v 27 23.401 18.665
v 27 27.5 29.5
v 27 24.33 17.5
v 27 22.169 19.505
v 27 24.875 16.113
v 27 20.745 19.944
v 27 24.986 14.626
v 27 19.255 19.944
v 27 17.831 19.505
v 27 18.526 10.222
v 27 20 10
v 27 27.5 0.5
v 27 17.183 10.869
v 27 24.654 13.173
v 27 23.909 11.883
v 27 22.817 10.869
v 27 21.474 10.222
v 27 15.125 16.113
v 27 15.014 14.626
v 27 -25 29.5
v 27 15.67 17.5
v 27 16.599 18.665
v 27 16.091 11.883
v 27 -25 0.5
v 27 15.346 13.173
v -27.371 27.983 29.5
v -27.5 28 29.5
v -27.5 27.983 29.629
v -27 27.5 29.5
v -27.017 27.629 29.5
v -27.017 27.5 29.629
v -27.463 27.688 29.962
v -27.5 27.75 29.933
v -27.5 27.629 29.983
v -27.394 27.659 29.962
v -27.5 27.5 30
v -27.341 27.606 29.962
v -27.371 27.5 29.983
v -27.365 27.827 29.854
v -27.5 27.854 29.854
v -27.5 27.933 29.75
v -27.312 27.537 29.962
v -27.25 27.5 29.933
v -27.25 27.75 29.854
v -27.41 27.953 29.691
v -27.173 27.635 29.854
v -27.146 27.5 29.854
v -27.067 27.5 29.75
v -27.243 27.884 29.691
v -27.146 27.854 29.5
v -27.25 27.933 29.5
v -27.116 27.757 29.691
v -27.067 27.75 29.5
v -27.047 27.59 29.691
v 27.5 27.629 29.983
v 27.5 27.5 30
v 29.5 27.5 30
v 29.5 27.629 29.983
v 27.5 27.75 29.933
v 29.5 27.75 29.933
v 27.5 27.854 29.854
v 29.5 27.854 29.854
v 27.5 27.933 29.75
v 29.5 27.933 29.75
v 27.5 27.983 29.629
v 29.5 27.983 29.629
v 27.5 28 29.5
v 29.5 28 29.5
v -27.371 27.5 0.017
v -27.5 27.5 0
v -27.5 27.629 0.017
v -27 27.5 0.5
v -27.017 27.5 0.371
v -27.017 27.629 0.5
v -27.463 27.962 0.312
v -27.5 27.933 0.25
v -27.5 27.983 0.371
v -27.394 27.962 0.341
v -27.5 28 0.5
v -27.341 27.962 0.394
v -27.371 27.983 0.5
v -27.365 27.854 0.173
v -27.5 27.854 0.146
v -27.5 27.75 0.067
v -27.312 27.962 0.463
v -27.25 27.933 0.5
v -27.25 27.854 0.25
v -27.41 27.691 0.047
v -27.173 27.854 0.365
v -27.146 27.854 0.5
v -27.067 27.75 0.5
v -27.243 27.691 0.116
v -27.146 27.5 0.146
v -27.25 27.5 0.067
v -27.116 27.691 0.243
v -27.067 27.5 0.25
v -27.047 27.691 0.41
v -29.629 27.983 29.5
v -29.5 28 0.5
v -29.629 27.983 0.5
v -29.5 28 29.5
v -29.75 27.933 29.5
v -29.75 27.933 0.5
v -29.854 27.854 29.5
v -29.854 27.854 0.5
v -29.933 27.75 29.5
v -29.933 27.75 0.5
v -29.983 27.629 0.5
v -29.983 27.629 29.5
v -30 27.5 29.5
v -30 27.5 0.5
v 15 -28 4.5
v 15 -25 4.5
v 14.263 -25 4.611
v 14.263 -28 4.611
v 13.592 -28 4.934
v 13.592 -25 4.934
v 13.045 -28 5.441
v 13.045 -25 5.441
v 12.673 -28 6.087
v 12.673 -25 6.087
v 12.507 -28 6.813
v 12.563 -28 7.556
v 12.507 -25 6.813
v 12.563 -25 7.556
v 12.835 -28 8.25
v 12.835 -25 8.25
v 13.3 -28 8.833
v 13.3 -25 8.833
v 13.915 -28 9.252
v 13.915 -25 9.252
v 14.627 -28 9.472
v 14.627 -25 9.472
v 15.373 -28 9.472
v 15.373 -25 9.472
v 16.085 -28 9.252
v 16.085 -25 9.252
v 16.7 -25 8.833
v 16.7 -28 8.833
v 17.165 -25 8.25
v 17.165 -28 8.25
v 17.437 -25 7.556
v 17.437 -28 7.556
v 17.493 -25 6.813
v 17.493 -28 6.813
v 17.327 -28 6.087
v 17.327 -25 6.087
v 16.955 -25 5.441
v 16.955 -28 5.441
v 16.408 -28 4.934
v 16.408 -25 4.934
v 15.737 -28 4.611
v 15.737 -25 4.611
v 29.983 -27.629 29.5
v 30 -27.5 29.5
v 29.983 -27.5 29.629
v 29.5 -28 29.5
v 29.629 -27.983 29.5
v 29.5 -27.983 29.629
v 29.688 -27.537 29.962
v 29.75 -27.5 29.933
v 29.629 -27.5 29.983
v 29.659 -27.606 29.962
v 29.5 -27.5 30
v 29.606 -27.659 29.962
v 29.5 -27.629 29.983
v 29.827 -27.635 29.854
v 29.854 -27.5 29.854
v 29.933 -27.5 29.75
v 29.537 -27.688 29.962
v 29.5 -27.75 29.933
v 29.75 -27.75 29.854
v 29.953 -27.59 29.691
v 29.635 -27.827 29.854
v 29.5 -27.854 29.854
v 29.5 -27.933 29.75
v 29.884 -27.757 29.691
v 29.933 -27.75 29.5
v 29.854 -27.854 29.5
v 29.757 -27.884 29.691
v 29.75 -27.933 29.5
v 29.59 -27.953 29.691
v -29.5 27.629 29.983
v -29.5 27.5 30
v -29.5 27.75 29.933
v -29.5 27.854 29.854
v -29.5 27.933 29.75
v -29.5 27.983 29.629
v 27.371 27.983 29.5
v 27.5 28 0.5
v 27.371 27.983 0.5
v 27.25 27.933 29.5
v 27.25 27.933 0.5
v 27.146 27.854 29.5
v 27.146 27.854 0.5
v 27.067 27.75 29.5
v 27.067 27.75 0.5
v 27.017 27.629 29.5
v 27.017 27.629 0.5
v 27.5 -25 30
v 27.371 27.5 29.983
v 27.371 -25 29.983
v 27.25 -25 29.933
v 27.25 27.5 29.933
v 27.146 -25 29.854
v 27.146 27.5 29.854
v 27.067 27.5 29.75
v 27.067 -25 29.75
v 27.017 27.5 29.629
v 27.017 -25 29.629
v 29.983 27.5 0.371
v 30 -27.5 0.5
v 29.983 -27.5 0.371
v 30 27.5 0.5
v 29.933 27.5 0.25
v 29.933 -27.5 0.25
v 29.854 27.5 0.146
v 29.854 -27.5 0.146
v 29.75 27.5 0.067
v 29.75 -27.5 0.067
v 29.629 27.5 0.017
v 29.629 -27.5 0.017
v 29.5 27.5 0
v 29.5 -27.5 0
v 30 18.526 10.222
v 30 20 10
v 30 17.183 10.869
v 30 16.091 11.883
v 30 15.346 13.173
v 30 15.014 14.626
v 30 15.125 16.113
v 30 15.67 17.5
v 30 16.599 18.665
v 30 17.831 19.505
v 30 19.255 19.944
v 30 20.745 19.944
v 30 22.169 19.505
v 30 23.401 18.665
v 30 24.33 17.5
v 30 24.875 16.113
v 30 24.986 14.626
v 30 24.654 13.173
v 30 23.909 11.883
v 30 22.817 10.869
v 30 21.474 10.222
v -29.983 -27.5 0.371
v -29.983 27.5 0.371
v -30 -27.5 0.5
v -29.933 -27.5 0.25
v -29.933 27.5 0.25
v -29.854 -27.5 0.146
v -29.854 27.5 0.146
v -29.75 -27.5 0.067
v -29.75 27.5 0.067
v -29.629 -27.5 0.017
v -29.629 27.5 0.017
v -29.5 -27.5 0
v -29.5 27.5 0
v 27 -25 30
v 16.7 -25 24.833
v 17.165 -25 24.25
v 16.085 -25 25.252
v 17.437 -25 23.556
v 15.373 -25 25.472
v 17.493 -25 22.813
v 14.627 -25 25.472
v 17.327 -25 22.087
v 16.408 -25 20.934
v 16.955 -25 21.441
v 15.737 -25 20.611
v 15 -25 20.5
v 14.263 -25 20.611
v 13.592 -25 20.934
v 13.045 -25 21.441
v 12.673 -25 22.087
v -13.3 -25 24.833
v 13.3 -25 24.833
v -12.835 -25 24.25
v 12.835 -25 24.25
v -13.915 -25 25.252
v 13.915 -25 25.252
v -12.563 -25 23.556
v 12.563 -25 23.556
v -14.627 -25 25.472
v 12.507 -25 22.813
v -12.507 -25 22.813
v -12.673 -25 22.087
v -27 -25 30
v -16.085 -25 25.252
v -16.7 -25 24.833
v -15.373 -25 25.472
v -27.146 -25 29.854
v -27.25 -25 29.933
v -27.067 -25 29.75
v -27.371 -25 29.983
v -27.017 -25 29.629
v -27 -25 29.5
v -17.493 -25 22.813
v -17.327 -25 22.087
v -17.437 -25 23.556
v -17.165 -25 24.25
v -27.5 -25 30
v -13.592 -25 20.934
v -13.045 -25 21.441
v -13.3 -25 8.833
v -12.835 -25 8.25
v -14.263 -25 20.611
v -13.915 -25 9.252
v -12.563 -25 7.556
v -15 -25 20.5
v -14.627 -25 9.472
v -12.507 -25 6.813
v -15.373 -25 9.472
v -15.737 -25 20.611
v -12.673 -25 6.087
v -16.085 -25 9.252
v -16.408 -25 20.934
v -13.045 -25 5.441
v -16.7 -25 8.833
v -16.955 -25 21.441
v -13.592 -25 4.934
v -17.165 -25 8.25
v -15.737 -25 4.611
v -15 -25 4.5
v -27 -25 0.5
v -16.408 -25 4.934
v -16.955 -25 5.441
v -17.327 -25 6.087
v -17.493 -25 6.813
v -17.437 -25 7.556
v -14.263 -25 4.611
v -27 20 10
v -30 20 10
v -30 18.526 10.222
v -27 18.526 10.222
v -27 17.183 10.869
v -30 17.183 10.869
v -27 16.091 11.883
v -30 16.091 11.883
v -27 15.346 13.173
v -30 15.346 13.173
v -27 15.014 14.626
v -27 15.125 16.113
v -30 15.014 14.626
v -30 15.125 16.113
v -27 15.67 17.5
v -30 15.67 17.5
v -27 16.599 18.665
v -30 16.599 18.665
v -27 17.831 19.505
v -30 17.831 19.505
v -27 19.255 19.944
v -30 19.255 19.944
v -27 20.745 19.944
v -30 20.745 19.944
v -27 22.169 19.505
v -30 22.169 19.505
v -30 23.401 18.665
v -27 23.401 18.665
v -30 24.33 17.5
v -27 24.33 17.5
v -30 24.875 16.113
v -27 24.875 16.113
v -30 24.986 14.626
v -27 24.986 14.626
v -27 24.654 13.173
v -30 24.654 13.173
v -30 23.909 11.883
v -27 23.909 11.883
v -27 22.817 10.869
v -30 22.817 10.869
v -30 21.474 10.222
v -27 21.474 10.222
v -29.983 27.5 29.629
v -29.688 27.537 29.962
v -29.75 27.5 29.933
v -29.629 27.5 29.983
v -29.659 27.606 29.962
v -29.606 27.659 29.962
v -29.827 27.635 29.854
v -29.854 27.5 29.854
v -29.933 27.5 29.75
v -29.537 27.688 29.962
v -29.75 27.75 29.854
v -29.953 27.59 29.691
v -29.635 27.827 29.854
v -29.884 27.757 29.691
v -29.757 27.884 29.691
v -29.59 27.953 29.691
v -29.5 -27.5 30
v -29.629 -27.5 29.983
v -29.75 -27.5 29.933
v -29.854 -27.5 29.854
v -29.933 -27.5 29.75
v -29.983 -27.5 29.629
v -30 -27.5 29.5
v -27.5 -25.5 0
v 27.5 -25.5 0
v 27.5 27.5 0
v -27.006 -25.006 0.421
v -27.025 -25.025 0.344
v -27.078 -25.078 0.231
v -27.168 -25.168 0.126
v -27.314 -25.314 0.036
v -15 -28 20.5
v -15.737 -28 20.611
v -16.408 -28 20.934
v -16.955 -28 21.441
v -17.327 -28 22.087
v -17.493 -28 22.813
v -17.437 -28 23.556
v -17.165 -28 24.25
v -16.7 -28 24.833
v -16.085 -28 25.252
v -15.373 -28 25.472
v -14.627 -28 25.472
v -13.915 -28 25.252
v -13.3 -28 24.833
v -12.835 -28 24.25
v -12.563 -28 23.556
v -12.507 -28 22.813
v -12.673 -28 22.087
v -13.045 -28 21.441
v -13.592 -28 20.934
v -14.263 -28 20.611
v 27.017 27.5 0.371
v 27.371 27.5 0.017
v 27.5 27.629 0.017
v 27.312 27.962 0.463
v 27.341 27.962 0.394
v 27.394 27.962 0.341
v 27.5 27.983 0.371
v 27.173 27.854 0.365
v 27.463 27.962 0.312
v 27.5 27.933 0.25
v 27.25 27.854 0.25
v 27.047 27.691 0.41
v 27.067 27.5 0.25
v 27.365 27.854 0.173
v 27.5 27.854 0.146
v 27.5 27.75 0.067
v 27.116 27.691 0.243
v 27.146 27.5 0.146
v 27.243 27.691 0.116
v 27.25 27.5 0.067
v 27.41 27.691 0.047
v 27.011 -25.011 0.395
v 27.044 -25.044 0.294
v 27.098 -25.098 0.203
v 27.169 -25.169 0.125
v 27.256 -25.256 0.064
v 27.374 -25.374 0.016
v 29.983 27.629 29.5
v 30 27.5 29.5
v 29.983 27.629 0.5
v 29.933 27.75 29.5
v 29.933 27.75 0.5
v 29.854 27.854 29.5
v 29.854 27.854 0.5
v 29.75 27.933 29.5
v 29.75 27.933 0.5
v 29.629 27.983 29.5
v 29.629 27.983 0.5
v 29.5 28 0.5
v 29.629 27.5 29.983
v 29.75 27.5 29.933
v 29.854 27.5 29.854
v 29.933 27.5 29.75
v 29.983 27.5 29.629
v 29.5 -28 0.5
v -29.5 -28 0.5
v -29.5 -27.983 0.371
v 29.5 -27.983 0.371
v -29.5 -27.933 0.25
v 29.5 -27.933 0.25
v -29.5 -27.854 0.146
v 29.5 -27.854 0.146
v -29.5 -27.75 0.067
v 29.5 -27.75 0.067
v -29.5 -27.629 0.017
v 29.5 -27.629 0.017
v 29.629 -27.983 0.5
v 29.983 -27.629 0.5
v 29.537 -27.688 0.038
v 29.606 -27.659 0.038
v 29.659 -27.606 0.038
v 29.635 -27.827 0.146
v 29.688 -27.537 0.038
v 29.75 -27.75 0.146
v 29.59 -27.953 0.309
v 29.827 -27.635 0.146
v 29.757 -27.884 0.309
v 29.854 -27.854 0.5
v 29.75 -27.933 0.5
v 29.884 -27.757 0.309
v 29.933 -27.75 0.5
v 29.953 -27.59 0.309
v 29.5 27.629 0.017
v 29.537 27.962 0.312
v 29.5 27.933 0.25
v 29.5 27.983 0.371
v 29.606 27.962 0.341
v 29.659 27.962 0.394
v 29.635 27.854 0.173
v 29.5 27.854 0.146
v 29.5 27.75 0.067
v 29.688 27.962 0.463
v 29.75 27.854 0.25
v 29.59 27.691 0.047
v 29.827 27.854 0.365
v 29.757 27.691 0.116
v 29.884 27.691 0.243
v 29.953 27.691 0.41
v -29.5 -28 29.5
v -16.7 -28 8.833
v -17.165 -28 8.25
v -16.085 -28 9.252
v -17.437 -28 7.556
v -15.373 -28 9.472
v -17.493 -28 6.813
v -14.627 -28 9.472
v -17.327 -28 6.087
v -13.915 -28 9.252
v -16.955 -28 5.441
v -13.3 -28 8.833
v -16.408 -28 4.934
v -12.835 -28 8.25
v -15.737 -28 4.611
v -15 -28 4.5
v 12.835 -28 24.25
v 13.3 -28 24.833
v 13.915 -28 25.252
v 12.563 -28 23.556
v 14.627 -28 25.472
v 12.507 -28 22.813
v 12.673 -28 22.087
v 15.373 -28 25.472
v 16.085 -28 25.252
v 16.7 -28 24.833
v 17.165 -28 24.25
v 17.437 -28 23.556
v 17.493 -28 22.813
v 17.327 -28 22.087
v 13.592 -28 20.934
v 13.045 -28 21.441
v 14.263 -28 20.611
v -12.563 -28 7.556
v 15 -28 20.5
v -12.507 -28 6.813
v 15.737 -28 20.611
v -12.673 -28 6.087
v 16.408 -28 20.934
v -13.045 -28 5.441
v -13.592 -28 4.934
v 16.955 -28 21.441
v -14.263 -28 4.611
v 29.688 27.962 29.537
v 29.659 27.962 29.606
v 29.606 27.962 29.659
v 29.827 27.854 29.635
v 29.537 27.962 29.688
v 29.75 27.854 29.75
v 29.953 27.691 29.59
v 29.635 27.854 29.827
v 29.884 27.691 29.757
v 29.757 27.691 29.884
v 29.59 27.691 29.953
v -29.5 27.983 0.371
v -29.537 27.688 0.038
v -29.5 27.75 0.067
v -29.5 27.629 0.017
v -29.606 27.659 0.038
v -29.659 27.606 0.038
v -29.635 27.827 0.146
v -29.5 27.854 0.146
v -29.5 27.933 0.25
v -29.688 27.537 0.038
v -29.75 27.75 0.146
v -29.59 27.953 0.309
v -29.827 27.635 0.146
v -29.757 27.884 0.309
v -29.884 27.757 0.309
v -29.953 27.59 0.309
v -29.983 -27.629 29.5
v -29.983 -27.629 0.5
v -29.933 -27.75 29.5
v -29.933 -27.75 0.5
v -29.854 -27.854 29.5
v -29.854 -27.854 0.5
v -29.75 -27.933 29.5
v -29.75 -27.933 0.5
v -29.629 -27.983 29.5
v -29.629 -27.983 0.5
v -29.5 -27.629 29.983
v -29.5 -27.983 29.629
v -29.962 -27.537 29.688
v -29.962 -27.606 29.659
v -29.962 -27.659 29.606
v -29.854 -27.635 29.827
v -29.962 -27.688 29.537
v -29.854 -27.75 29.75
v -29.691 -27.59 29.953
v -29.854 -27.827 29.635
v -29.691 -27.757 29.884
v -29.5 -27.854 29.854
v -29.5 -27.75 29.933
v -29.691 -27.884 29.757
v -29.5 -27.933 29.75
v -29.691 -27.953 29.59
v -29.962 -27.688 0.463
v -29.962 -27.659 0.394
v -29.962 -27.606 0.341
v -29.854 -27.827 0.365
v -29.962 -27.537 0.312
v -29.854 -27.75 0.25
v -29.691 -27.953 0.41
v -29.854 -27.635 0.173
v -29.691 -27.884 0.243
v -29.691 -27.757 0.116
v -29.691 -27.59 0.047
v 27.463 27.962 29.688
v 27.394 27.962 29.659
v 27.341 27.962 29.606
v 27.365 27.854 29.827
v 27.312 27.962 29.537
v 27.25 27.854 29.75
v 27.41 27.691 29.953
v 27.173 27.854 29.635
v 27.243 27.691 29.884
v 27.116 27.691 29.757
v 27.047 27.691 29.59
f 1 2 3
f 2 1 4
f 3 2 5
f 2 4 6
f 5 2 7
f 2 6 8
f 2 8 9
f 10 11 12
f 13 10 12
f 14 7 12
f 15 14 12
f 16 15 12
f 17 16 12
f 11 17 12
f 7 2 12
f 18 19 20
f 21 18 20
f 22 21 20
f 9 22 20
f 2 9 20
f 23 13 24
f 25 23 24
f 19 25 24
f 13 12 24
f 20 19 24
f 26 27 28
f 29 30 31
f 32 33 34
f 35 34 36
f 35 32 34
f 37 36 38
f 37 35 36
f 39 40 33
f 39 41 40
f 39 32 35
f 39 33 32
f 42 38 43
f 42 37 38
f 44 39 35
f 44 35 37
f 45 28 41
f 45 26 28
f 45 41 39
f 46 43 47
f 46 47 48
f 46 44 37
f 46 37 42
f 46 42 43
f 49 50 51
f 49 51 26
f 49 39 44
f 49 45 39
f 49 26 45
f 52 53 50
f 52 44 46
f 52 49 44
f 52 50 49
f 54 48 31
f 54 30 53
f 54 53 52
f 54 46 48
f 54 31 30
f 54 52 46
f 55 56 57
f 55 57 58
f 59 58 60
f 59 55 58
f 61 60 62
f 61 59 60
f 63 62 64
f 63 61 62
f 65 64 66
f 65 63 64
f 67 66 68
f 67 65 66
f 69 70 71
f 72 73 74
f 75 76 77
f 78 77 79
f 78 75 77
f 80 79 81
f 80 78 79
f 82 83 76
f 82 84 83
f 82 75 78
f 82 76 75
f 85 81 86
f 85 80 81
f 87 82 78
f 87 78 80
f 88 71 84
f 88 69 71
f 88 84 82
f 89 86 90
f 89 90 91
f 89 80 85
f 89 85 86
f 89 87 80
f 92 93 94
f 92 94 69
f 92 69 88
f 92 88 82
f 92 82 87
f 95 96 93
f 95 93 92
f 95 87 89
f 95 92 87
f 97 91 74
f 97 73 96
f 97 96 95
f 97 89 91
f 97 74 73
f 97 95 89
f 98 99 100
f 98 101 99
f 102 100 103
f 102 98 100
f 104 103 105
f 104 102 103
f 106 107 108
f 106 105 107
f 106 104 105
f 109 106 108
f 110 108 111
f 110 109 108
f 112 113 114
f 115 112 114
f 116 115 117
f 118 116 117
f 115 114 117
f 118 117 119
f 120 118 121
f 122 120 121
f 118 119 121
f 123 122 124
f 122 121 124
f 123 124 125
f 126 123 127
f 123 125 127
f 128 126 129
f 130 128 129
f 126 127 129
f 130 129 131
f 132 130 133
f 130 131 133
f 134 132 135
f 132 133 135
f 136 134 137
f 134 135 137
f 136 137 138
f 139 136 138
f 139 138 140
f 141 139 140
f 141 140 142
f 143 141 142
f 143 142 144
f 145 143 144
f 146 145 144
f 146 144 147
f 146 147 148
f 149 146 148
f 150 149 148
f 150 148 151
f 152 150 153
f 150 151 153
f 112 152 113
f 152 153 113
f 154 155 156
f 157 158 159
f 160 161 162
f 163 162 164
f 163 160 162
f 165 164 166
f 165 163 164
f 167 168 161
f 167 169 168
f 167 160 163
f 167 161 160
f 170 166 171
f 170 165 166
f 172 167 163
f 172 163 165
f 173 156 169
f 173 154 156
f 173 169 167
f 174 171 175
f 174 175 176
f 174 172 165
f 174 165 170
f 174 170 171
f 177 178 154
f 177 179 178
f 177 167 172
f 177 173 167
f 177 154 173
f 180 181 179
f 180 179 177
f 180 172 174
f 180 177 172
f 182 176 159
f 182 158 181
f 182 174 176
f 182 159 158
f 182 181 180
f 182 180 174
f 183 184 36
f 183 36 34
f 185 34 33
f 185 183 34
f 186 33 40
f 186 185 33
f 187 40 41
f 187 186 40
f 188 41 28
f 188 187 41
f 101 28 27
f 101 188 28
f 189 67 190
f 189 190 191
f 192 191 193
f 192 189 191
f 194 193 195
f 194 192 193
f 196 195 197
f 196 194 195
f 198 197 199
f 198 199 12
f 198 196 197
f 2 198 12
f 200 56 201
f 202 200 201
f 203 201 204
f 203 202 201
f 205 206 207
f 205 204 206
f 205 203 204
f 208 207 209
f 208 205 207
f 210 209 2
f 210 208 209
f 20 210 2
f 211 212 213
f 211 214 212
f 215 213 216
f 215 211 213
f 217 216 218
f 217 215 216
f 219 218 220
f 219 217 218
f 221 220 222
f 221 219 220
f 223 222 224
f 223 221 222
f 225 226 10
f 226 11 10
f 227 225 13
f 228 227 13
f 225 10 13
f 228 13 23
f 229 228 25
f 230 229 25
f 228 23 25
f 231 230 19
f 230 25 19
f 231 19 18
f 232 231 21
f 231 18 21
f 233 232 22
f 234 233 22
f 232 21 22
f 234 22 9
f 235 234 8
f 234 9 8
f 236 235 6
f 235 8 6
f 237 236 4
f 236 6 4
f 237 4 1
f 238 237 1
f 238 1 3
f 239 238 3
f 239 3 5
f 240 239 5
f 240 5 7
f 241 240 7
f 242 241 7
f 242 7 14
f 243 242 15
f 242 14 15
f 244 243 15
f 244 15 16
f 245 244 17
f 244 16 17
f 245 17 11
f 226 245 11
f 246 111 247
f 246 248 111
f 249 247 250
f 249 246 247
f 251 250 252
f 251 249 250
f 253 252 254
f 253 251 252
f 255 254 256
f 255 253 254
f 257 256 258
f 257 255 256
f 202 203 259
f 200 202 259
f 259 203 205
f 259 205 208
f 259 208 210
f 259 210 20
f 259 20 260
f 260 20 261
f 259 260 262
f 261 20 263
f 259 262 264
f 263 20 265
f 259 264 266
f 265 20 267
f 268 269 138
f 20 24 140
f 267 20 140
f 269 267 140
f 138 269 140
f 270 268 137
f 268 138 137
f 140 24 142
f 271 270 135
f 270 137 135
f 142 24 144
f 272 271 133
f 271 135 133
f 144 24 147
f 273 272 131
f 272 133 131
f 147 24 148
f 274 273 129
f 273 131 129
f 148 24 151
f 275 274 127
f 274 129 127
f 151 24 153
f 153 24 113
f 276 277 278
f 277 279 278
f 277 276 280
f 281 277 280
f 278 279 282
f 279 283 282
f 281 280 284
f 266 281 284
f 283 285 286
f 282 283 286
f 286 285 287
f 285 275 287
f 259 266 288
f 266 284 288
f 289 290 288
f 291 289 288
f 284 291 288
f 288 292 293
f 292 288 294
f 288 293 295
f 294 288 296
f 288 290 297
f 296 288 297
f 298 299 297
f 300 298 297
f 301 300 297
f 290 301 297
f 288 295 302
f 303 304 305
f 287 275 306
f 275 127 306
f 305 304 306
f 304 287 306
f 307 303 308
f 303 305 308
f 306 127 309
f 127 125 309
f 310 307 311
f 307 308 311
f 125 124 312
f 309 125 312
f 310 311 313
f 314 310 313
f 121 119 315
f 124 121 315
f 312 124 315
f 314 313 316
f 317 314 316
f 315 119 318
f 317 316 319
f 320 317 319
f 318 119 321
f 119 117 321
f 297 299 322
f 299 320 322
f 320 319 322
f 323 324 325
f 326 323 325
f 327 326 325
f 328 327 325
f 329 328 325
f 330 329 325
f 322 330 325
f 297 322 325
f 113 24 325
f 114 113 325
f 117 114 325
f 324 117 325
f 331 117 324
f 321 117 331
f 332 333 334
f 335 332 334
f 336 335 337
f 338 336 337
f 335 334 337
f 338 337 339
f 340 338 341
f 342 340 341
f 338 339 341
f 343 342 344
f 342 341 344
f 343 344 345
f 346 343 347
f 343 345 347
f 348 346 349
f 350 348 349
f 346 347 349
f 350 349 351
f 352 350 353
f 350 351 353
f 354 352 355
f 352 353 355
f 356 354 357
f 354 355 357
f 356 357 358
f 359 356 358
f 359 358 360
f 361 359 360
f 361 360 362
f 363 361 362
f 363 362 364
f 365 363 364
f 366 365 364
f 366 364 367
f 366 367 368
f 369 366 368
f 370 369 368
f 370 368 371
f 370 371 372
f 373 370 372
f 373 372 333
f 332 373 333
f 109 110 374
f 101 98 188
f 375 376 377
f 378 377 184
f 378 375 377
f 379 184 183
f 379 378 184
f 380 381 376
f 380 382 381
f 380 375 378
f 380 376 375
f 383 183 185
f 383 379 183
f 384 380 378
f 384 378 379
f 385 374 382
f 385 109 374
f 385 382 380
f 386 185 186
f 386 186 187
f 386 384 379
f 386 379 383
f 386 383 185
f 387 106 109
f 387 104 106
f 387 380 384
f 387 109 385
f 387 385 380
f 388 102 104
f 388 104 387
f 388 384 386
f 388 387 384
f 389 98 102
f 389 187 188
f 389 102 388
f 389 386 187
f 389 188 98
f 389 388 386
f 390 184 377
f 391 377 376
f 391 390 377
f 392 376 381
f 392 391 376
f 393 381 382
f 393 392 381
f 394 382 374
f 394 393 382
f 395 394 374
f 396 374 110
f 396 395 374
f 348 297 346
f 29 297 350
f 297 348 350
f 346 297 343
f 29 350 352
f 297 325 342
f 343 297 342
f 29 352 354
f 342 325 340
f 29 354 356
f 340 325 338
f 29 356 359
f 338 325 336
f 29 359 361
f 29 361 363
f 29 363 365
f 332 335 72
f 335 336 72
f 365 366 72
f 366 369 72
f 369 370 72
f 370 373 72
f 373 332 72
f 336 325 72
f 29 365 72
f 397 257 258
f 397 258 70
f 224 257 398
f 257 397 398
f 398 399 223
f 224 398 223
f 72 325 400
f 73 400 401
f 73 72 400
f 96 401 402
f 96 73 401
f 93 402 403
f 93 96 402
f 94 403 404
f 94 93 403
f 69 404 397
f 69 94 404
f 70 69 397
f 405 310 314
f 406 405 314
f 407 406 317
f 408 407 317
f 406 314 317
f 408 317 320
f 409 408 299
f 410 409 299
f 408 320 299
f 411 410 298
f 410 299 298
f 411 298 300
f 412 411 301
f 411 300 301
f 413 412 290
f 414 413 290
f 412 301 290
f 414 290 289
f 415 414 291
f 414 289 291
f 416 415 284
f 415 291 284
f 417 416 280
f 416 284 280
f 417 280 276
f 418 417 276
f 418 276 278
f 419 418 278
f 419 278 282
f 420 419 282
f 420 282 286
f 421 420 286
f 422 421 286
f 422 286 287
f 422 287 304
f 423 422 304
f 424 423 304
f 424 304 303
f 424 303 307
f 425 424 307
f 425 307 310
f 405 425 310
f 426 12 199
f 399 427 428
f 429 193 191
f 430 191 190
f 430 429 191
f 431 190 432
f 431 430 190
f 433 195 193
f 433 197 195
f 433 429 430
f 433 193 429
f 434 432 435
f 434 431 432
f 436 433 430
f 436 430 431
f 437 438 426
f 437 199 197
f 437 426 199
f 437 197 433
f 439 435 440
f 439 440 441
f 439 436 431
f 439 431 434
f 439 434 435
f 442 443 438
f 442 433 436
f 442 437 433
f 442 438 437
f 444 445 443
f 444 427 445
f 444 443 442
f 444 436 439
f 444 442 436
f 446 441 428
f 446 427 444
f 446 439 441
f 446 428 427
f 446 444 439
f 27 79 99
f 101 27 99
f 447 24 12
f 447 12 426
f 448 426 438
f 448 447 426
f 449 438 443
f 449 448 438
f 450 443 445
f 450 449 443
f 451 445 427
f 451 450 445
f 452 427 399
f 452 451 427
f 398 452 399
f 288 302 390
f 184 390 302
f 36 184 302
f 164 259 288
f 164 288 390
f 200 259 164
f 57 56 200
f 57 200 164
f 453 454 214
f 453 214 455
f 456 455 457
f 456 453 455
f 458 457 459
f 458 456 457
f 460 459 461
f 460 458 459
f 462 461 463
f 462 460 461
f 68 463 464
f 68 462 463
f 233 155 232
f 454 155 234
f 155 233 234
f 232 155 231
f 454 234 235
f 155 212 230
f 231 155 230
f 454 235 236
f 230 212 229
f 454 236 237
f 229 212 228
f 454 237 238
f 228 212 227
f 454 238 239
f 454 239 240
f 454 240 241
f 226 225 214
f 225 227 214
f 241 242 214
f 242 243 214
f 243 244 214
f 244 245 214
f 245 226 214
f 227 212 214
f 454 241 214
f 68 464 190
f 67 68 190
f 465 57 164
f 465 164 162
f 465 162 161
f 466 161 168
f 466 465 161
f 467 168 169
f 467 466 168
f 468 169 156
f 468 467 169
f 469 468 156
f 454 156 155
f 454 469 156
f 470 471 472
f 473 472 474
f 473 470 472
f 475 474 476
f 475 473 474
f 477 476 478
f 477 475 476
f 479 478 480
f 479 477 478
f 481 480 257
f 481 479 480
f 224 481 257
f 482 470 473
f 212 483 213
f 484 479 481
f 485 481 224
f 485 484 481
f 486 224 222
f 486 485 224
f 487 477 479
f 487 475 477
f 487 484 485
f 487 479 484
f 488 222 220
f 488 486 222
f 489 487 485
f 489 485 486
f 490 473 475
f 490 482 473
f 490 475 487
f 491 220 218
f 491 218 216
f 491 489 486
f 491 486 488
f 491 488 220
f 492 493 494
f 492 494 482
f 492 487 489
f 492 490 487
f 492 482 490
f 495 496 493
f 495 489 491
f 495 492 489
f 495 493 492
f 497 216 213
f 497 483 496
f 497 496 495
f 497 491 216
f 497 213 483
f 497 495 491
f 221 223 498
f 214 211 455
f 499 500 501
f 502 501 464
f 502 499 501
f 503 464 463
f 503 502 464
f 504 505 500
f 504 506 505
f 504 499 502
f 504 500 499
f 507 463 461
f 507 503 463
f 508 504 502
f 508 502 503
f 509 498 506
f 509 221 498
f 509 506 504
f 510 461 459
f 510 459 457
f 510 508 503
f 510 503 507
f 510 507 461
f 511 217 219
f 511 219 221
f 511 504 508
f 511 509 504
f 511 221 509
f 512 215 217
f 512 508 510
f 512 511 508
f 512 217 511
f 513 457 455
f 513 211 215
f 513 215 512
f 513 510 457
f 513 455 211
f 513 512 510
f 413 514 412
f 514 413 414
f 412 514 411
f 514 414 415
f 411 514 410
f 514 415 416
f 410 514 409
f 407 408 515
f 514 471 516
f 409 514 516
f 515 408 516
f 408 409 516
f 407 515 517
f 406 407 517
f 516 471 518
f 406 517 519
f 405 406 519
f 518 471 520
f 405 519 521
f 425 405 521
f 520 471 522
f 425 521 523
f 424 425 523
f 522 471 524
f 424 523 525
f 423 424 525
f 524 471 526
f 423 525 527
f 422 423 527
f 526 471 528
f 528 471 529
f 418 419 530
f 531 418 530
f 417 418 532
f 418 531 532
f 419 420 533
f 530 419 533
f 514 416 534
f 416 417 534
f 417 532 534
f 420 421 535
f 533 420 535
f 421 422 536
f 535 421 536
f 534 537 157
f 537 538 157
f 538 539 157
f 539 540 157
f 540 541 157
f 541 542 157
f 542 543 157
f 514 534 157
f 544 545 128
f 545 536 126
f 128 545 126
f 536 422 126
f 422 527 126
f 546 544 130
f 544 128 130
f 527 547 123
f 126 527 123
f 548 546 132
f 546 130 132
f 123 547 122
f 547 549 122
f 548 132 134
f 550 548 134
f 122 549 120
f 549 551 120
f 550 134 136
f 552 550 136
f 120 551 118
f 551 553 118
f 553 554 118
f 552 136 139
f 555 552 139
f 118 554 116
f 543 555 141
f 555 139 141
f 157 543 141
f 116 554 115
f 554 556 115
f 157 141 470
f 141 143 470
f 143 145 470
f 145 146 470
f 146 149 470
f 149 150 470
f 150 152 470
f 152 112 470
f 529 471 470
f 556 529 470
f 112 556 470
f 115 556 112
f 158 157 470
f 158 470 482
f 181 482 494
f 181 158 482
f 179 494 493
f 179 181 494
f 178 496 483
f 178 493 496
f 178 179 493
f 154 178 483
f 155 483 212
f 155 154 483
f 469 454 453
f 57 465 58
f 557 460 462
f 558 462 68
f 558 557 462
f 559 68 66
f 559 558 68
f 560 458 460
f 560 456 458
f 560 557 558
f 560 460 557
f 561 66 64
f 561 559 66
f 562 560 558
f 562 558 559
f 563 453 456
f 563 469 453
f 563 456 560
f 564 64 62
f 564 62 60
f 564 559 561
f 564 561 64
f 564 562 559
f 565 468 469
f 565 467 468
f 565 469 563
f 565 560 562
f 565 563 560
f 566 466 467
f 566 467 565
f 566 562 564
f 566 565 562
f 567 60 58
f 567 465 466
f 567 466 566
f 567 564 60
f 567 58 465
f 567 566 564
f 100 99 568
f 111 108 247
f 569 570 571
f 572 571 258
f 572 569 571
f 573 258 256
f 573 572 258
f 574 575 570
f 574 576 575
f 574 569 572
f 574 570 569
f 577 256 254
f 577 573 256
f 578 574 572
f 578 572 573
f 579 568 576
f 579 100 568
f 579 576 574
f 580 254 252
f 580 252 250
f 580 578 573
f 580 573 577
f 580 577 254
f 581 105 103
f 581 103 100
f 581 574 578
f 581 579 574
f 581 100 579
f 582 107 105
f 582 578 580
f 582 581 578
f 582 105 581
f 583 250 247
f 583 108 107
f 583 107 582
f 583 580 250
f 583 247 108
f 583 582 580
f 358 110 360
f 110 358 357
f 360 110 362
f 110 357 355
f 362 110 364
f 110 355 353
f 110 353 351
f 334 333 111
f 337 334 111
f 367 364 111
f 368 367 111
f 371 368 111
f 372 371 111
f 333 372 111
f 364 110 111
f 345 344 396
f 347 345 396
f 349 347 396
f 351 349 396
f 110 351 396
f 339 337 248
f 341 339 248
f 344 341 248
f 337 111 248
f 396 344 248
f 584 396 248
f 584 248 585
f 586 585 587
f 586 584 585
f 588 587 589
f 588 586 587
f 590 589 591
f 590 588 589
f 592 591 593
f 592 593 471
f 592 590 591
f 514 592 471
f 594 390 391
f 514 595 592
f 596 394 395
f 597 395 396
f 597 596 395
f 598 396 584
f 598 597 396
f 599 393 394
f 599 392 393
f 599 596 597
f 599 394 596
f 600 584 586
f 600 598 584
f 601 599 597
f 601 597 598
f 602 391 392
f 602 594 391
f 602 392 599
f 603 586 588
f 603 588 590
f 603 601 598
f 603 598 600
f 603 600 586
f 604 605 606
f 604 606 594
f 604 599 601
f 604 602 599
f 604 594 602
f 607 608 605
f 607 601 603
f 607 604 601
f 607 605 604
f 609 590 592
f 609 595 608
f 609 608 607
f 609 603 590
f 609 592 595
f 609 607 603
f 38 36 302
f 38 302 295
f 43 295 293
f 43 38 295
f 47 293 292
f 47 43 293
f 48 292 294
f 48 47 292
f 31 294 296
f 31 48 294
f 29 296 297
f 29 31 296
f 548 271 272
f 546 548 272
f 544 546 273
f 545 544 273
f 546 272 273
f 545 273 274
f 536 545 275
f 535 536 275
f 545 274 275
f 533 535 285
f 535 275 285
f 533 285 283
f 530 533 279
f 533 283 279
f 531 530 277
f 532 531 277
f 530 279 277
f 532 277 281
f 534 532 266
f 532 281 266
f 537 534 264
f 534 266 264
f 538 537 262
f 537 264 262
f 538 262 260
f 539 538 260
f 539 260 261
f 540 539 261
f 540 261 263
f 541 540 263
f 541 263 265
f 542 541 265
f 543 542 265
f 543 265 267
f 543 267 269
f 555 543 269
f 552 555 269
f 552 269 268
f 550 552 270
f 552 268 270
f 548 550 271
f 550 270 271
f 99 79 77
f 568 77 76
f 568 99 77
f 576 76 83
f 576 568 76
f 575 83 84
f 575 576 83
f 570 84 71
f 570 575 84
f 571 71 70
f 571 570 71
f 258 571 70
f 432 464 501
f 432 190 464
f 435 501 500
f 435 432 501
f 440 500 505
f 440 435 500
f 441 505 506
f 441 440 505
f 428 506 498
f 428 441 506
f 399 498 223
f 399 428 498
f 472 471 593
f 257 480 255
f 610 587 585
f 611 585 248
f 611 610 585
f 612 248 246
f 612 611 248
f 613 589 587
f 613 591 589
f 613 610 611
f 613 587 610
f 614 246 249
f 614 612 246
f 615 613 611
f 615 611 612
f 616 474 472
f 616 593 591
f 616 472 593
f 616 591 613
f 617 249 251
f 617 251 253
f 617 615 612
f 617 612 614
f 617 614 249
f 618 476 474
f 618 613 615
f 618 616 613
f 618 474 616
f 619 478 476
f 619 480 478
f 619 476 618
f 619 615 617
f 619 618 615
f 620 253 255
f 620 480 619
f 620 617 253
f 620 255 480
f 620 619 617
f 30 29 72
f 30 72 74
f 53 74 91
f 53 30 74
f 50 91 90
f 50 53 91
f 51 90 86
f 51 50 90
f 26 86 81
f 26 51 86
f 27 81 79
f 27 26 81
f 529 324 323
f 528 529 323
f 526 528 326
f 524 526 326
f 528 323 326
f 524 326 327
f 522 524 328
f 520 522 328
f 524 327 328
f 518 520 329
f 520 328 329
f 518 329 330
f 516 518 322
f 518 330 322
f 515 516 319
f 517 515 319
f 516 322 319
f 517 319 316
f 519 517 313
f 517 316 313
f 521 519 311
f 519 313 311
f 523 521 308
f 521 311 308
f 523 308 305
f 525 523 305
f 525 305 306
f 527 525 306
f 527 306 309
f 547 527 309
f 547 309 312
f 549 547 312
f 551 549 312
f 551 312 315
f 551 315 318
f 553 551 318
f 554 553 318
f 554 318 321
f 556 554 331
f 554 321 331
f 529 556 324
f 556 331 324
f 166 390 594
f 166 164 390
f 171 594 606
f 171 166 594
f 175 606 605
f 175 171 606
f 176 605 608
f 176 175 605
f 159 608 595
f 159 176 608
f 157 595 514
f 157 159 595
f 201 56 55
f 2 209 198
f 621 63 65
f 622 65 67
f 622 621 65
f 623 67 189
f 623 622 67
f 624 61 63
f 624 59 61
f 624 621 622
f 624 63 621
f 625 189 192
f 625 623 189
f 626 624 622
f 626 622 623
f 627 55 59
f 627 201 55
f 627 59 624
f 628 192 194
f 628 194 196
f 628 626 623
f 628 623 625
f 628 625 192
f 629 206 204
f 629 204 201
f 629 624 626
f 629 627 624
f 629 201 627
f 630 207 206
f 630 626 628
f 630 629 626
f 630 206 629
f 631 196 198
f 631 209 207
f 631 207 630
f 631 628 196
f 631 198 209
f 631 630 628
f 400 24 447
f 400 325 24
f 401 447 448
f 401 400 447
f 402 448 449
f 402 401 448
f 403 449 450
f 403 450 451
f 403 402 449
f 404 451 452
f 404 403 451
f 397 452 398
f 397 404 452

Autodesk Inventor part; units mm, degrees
ref_plane "YZ Plane" through (0, 0, 0) normal (1, 0, 0) x (0, 1, 0)
ref_plane "XZ Plane" through (0, 0, 0) normal (0, 1, 0) x (-1, 0, 0)
ref_plane "XY Plane" through (0, 0, 0) normal (0, 0, 1) x (1, 0, 0)
sketch "Sketch1" plane through (0, 0, 0) normal (0, 0, 1) x (1, 0, 0)
  line L0 (27, 28) -> (27, -25)
  line L1 (27, -25) -> (-27, -25)
  line L2 (-27, -25) -> (-27, 28)
  line L3 (-30, 28) -> (-30, -28)
  line L4 (-30, -28) -> (30, -28)
  line L5 (30, -28) -> (30, 28)
  line L6 (30, 28) -> (27, 28)
  line L7 (-27, 28) -> (-30, 28)
  point P0 (0, 0)
  dimension "d4" = 56
  dimension "d5" = 53
extrude "Extrusion1" add sketch "Sketch1" along normal blind 30
sketch "Sketch2" plane through (-27, -25, 0) normal (1, 0, 0) x (0, 0, -1)
  line L0 (0, 0) -> (-30, 0) projected
  line L1 (0, 0) -> (0, 53) projected
  point P0 (0, 25)
  point P1 (-15, 45)
  dimension "d8" = 45
  dimension "d9" = 15
hole "Hole1" at (-27, 20, 15) direction (-1, 0, 0) diameter 10 end through all
sketch "Sketch3" plane through (30, -28, 0) normal (1, 0, 0) x (0, 0, -1)
  line L0 (0, 3) -> (-30, 3) projected
  line L1 (-30, 0) -> (-30, 56) projected
  point P0 (0, 28)
  point P1 (-15, 48)
  dimension "d17" = 45
  dimension "d18" = 15
hole "Hole2" at (30, 20, 15) direction (-1, 0, 0) diameter 10 end through all
sketch "Sketch4" plane through (-30, -28, 0) normal (0, -1, 0) x (1, 0, 0)
  line L0 (0, 0) -> (60, 0) projected
  line L1 (60, 0) -> (60, 30) projected
  line L2 (0, 30) -> (60, 30) projected
  line L3 (0, 0) -> (0, 30) projected
  point P0 (30, 0)
  point P1 (45, 7)
  point P2 (45, 23)
  point P3 (15, 7)
  point P4 (15, 23)
  dimension "d26" = 7
  dimension "d27" = 15
  dimension "d28" = 7
  dimension "d29" = 15
  dimension "d30" = 7
  dimension "d31" = 15
  dimension "d32" = 15
  dimension "d33" = 7
hole "Hole3" at (15, -28, 23) at (15, -28, 7) at (-15, -28, 7) at (-15, -28, 23) direction (0, 1, 0) diameter 5 end through all
fillet "Fillet1" radius 0.5 21 edges at (30, -28, 15) (30, 0, 0) (27, 1.5, 0) (0, -25, 0) (0, -28, 0) (30, 0, 30) (30, 28, 15) (0, -28, 30) (-30, -28, 15) (-27, 1.5, 0) (-27, 28, 15) (-30, 28, 15) (-30, 0, 0) (-27, 1.5, 30) (-30, 0, 30) (27, 1.5, 30) (27, 28, 15) (28.5, 28, 0) (28.5, 28, 30) (-28.5, 28, 0) (-28.5, 28, 30)
properties part number "HOLDER" material "Steel, Alloy"
